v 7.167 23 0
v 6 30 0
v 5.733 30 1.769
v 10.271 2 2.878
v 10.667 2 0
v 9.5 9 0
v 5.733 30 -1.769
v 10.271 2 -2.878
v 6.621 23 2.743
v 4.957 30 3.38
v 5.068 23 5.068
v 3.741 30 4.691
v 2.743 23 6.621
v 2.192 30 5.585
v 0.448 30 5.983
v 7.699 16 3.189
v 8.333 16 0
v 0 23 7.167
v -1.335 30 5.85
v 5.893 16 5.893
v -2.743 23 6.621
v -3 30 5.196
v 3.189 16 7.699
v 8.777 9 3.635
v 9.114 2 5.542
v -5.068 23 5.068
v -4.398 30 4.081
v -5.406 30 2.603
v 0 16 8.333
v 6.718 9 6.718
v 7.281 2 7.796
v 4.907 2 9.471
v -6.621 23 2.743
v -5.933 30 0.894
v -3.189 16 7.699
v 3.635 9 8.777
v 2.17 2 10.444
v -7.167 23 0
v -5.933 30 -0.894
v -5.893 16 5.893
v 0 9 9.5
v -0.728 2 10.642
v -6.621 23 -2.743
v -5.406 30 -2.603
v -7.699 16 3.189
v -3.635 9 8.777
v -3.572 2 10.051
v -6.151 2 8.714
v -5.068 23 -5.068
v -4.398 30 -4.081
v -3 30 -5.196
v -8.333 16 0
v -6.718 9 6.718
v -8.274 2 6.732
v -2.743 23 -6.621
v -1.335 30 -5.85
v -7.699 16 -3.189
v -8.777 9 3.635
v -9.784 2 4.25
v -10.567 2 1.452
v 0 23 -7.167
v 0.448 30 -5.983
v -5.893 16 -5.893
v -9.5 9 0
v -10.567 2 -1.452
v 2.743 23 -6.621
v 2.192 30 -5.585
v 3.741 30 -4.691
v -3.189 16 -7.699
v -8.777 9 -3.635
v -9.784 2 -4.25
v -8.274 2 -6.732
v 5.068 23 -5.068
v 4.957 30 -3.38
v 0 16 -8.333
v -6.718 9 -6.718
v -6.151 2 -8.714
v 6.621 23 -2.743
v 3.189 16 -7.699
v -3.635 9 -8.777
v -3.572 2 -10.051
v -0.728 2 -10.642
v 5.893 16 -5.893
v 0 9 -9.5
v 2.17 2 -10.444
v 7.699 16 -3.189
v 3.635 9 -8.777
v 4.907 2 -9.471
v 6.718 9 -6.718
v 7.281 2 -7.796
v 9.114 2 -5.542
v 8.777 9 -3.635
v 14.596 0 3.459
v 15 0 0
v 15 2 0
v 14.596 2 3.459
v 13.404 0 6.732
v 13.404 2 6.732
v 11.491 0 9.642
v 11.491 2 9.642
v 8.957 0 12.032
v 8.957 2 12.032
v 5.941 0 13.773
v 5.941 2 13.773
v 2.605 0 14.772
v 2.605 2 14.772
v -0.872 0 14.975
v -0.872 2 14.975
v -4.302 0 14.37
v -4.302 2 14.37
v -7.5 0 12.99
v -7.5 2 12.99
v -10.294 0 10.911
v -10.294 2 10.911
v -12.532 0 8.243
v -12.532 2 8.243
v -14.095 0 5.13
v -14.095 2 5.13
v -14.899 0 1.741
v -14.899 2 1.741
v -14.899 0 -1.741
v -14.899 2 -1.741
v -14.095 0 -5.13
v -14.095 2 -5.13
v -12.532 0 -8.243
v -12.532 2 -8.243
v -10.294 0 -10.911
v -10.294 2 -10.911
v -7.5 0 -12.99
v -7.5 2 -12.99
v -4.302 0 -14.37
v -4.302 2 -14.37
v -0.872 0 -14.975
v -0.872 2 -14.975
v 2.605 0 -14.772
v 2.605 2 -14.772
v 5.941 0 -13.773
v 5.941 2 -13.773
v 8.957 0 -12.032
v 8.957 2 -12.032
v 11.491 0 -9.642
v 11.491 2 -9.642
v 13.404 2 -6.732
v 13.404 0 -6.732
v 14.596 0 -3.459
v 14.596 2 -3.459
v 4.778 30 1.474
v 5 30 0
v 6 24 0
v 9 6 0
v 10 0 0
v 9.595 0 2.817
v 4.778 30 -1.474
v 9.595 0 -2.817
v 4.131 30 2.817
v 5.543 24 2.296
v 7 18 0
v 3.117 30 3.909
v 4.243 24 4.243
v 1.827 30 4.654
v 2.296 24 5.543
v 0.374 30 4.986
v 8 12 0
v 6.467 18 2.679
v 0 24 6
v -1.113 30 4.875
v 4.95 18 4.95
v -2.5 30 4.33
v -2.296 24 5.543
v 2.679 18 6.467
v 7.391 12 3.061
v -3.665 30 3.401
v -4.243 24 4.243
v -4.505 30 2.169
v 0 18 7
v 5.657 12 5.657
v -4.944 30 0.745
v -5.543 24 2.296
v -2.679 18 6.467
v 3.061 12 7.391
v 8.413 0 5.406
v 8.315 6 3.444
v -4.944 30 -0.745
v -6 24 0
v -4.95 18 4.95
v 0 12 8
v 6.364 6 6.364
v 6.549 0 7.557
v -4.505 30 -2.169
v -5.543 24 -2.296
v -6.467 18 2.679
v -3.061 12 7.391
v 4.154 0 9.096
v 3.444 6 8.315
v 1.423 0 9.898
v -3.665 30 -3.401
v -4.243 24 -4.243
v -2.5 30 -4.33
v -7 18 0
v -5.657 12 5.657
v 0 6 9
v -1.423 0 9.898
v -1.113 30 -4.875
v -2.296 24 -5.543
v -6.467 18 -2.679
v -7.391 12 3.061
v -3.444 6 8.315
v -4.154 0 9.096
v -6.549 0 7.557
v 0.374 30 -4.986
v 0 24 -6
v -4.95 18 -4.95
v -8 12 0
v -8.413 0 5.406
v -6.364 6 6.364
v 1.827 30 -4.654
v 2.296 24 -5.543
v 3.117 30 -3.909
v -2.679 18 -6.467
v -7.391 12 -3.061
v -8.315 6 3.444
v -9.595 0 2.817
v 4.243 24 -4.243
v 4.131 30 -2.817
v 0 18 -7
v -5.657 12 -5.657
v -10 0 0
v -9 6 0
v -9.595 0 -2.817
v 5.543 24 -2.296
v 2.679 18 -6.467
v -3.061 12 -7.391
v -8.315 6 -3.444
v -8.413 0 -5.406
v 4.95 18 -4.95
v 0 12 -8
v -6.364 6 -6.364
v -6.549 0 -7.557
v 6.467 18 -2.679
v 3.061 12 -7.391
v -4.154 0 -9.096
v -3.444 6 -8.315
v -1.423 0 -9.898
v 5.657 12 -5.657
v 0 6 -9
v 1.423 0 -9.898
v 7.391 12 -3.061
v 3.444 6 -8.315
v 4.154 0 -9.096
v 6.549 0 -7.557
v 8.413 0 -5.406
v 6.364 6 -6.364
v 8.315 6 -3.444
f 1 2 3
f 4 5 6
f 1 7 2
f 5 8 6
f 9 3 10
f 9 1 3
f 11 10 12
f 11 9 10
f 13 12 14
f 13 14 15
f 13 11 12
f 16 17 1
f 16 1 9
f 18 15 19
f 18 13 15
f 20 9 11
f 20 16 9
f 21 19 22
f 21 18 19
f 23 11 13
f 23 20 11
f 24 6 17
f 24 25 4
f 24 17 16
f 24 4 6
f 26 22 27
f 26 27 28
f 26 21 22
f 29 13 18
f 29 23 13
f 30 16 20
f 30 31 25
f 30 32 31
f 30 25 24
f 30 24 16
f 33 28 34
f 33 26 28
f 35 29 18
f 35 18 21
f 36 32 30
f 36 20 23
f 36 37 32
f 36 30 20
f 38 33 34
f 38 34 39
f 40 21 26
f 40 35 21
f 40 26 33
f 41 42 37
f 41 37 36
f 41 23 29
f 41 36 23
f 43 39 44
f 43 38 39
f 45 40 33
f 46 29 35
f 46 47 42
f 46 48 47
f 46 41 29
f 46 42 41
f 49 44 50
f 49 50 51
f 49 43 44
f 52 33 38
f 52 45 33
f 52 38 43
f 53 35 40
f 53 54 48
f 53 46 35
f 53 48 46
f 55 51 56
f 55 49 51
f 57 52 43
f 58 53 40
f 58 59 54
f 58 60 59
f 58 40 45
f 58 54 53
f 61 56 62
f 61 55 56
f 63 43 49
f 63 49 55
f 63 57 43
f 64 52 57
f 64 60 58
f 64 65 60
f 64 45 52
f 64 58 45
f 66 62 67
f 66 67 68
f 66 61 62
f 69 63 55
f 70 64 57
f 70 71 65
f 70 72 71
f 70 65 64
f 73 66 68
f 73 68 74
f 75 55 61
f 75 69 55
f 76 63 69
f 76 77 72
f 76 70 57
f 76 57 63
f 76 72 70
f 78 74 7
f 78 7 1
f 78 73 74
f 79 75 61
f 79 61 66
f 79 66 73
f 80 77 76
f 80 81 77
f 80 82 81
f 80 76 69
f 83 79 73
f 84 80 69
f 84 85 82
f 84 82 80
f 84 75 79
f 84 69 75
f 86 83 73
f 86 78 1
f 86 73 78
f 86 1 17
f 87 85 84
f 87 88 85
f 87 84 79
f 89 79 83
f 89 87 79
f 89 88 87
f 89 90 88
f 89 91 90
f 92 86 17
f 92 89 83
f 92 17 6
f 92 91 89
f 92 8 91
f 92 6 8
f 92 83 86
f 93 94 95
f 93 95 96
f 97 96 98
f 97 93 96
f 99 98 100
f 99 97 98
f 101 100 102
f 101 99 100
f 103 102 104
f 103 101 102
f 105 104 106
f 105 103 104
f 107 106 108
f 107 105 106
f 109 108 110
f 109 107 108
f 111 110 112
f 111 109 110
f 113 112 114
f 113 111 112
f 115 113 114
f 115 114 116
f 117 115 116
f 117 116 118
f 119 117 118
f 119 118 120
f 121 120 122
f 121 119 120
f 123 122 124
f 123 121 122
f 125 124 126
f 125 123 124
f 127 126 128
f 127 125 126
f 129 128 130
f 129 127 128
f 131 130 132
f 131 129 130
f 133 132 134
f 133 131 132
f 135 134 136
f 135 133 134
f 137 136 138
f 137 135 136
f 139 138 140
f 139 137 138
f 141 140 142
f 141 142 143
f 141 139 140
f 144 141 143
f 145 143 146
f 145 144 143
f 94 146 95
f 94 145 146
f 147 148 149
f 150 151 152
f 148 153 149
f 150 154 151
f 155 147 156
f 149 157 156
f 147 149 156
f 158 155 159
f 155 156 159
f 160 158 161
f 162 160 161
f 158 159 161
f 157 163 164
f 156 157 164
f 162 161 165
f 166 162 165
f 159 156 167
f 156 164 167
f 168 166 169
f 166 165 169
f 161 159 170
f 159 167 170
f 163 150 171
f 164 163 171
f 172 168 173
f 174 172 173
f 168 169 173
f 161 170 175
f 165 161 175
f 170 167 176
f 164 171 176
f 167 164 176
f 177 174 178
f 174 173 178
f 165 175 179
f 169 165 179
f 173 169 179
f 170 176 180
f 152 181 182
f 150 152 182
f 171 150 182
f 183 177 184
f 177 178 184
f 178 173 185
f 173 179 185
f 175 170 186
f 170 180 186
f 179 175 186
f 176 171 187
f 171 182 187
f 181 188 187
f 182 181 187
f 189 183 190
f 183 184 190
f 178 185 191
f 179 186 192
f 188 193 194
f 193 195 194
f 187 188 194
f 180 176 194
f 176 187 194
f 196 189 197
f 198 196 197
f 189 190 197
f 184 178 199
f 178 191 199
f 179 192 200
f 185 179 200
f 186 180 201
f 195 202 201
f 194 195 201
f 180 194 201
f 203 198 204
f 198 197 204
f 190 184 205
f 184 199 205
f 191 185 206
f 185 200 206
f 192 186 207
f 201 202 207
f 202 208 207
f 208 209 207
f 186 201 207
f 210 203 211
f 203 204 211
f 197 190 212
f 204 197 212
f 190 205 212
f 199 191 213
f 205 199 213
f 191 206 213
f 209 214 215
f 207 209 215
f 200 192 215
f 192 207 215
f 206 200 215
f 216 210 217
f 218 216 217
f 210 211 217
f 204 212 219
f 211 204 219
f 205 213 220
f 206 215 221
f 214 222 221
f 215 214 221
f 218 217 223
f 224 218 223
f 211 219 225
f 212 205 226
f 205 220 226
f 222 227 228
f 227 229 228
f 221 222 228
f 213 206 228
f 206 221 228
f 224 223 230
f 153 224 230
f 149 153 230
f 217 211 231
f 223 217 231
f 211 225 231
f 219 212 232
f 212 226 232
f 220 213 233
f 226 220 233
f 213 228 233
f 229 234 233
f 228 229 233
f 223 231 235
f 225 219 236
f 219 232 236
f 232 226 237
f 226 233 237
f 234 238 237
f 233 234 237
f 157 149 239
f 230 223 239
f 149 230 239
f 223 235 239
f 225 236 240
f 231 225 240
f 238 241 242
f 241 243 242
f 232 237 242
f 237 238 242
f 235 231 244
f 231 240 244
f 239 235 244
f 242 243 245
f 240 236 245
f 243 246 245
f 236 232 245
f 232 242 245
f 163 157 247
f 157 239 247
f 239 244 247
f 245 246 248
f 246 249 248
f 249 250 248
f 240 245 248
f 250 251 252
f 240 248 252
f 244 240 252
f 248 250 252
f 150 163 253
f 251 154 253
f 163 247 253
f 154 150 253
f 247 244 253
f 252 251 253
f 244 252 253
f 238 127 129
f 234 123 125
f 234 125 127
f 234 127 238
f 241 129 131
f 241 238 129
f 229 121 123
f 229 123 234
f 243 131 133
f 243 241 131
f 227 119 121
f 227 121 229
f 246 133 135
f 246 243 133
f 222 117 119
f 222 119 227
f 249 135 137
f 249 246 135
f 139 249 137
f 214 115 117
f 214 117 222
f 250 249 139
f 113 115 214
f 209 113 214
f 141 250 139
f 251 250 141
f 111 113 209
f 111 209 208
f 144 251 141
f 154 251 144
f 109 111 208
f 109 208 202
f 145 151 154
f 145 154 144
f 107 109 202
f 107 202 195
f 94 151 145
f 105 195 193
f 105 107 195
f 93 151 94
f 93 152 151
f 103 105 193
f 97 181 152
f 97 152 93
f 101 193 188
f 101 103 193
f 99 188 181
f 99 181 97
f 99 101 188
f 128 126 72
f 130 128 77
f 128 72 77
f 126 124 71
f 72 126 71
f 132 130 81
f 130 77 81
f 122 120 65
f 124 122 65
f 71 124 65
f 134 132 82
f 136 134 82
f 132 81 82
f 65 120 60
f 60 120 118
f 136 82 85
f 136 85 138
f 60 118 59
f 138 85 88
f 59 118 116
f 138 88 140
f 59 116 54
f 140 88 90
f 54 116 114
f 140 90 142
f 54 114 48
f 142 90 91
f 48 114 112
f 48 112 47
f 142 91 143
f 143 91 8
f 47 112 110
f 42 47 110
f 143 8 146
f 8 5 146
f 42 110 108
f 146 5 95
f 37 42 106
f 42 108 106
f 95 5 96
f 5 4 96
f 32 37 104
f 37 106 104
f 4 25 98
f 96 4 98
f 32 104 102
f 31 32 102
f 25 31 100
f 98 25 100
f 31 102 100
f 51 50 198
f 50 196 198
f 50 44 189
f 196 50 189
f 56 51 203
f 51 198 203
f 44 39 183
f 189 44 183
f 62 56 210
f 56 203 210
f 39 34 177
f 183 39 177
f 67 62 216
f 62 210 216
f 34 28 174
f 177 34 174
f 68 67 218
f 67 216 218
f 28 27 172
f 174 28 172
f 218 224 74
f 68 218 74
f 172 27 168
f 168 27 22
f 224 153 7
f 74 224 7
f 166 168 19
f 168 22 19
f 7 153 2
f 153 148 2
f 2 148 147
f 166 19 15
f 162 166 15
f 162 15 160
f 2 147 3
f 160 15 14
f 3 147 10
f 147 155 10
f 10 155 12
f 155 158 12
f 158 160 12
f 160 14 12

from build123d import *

# Parameters (mm, degrees)
F2_R     = 6
F0_R     = 11
F6_R     = 15
F7_DEPTH = 2
F5_R     = 5
F4_R     = 10


with BuildPart() as f3:
    # F2 (on offset) → F3 section 0
    with BuildSketch(Plane.XZ.offset(-30)):
        Circle(F2_R)
    # F0 (on Front) → F3 section 1
    with BuildSketch(Plane.XZ):
        Circle(F0_R)
    loft()

    # F6 (on Front) → F7 (join)
    with BuildSketch(Plane.XZ):
        Circle(F6_R)
    extrude(amount=-F7_DEPTH)

    # F5 (on offset) → F8 section 0
    with BuildSketch(Plane.XZ.offset(-30)):
        Circle(F5_R)
    # F4 (on Front) → F8 section 1
    with BuildSketch(Plane.XZ):
        Circle(F4_R)
    loft(mode=Mode.SUBTRACT)


solid = f3.part
